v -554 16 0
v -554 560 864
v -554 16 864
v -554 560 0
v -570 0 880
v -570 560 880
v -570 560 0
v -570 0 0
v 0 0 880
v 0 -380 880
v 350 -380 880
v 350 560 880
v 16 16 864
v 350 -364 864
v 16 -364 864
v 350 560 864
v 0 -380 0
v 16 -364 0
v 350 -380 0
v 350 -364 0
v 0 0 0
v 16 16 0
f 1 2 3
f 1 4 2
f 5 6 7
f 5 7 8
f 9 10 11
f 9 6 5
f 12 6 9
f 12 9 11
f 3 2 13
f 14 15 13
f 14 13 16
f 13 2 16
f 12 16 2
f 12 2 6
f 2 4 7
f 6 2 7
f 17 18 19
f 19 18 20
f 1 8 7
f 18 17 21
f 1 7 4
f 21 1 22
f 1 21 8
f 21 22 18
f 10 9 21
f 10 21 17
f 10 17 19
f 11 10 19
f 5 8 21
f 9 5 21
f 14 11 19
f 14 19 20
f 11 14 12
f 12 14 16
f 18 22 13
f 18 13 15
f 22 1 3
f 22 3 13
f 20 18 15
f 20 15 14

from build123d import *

# Parameters (mm, degrees)
F1_DEPTH = 880
F2_T     = -16


with BuildPart() as f1:
    # F0 (on Top) → F1 (new body)
    with BuildSketch(Plane.XY):
        Polygon((-570, 0), (0, 0), (0, -380), (350, -380), (350, 560), (-570, 560), align=None)
    extrude(amount=F1_DEPTH)

    # F2
    f2_openings = [f1.faces().sort_by_distance(p)[0] for p in [
        (-110, 560, 440),
        (350, 90, 440),
        (-51.522678, 183.563715, 0),
    ]]
    offset(amount=F2_T, openings=f2_openings, kind=Kind.INTERSECTION)


solid = f1.part
